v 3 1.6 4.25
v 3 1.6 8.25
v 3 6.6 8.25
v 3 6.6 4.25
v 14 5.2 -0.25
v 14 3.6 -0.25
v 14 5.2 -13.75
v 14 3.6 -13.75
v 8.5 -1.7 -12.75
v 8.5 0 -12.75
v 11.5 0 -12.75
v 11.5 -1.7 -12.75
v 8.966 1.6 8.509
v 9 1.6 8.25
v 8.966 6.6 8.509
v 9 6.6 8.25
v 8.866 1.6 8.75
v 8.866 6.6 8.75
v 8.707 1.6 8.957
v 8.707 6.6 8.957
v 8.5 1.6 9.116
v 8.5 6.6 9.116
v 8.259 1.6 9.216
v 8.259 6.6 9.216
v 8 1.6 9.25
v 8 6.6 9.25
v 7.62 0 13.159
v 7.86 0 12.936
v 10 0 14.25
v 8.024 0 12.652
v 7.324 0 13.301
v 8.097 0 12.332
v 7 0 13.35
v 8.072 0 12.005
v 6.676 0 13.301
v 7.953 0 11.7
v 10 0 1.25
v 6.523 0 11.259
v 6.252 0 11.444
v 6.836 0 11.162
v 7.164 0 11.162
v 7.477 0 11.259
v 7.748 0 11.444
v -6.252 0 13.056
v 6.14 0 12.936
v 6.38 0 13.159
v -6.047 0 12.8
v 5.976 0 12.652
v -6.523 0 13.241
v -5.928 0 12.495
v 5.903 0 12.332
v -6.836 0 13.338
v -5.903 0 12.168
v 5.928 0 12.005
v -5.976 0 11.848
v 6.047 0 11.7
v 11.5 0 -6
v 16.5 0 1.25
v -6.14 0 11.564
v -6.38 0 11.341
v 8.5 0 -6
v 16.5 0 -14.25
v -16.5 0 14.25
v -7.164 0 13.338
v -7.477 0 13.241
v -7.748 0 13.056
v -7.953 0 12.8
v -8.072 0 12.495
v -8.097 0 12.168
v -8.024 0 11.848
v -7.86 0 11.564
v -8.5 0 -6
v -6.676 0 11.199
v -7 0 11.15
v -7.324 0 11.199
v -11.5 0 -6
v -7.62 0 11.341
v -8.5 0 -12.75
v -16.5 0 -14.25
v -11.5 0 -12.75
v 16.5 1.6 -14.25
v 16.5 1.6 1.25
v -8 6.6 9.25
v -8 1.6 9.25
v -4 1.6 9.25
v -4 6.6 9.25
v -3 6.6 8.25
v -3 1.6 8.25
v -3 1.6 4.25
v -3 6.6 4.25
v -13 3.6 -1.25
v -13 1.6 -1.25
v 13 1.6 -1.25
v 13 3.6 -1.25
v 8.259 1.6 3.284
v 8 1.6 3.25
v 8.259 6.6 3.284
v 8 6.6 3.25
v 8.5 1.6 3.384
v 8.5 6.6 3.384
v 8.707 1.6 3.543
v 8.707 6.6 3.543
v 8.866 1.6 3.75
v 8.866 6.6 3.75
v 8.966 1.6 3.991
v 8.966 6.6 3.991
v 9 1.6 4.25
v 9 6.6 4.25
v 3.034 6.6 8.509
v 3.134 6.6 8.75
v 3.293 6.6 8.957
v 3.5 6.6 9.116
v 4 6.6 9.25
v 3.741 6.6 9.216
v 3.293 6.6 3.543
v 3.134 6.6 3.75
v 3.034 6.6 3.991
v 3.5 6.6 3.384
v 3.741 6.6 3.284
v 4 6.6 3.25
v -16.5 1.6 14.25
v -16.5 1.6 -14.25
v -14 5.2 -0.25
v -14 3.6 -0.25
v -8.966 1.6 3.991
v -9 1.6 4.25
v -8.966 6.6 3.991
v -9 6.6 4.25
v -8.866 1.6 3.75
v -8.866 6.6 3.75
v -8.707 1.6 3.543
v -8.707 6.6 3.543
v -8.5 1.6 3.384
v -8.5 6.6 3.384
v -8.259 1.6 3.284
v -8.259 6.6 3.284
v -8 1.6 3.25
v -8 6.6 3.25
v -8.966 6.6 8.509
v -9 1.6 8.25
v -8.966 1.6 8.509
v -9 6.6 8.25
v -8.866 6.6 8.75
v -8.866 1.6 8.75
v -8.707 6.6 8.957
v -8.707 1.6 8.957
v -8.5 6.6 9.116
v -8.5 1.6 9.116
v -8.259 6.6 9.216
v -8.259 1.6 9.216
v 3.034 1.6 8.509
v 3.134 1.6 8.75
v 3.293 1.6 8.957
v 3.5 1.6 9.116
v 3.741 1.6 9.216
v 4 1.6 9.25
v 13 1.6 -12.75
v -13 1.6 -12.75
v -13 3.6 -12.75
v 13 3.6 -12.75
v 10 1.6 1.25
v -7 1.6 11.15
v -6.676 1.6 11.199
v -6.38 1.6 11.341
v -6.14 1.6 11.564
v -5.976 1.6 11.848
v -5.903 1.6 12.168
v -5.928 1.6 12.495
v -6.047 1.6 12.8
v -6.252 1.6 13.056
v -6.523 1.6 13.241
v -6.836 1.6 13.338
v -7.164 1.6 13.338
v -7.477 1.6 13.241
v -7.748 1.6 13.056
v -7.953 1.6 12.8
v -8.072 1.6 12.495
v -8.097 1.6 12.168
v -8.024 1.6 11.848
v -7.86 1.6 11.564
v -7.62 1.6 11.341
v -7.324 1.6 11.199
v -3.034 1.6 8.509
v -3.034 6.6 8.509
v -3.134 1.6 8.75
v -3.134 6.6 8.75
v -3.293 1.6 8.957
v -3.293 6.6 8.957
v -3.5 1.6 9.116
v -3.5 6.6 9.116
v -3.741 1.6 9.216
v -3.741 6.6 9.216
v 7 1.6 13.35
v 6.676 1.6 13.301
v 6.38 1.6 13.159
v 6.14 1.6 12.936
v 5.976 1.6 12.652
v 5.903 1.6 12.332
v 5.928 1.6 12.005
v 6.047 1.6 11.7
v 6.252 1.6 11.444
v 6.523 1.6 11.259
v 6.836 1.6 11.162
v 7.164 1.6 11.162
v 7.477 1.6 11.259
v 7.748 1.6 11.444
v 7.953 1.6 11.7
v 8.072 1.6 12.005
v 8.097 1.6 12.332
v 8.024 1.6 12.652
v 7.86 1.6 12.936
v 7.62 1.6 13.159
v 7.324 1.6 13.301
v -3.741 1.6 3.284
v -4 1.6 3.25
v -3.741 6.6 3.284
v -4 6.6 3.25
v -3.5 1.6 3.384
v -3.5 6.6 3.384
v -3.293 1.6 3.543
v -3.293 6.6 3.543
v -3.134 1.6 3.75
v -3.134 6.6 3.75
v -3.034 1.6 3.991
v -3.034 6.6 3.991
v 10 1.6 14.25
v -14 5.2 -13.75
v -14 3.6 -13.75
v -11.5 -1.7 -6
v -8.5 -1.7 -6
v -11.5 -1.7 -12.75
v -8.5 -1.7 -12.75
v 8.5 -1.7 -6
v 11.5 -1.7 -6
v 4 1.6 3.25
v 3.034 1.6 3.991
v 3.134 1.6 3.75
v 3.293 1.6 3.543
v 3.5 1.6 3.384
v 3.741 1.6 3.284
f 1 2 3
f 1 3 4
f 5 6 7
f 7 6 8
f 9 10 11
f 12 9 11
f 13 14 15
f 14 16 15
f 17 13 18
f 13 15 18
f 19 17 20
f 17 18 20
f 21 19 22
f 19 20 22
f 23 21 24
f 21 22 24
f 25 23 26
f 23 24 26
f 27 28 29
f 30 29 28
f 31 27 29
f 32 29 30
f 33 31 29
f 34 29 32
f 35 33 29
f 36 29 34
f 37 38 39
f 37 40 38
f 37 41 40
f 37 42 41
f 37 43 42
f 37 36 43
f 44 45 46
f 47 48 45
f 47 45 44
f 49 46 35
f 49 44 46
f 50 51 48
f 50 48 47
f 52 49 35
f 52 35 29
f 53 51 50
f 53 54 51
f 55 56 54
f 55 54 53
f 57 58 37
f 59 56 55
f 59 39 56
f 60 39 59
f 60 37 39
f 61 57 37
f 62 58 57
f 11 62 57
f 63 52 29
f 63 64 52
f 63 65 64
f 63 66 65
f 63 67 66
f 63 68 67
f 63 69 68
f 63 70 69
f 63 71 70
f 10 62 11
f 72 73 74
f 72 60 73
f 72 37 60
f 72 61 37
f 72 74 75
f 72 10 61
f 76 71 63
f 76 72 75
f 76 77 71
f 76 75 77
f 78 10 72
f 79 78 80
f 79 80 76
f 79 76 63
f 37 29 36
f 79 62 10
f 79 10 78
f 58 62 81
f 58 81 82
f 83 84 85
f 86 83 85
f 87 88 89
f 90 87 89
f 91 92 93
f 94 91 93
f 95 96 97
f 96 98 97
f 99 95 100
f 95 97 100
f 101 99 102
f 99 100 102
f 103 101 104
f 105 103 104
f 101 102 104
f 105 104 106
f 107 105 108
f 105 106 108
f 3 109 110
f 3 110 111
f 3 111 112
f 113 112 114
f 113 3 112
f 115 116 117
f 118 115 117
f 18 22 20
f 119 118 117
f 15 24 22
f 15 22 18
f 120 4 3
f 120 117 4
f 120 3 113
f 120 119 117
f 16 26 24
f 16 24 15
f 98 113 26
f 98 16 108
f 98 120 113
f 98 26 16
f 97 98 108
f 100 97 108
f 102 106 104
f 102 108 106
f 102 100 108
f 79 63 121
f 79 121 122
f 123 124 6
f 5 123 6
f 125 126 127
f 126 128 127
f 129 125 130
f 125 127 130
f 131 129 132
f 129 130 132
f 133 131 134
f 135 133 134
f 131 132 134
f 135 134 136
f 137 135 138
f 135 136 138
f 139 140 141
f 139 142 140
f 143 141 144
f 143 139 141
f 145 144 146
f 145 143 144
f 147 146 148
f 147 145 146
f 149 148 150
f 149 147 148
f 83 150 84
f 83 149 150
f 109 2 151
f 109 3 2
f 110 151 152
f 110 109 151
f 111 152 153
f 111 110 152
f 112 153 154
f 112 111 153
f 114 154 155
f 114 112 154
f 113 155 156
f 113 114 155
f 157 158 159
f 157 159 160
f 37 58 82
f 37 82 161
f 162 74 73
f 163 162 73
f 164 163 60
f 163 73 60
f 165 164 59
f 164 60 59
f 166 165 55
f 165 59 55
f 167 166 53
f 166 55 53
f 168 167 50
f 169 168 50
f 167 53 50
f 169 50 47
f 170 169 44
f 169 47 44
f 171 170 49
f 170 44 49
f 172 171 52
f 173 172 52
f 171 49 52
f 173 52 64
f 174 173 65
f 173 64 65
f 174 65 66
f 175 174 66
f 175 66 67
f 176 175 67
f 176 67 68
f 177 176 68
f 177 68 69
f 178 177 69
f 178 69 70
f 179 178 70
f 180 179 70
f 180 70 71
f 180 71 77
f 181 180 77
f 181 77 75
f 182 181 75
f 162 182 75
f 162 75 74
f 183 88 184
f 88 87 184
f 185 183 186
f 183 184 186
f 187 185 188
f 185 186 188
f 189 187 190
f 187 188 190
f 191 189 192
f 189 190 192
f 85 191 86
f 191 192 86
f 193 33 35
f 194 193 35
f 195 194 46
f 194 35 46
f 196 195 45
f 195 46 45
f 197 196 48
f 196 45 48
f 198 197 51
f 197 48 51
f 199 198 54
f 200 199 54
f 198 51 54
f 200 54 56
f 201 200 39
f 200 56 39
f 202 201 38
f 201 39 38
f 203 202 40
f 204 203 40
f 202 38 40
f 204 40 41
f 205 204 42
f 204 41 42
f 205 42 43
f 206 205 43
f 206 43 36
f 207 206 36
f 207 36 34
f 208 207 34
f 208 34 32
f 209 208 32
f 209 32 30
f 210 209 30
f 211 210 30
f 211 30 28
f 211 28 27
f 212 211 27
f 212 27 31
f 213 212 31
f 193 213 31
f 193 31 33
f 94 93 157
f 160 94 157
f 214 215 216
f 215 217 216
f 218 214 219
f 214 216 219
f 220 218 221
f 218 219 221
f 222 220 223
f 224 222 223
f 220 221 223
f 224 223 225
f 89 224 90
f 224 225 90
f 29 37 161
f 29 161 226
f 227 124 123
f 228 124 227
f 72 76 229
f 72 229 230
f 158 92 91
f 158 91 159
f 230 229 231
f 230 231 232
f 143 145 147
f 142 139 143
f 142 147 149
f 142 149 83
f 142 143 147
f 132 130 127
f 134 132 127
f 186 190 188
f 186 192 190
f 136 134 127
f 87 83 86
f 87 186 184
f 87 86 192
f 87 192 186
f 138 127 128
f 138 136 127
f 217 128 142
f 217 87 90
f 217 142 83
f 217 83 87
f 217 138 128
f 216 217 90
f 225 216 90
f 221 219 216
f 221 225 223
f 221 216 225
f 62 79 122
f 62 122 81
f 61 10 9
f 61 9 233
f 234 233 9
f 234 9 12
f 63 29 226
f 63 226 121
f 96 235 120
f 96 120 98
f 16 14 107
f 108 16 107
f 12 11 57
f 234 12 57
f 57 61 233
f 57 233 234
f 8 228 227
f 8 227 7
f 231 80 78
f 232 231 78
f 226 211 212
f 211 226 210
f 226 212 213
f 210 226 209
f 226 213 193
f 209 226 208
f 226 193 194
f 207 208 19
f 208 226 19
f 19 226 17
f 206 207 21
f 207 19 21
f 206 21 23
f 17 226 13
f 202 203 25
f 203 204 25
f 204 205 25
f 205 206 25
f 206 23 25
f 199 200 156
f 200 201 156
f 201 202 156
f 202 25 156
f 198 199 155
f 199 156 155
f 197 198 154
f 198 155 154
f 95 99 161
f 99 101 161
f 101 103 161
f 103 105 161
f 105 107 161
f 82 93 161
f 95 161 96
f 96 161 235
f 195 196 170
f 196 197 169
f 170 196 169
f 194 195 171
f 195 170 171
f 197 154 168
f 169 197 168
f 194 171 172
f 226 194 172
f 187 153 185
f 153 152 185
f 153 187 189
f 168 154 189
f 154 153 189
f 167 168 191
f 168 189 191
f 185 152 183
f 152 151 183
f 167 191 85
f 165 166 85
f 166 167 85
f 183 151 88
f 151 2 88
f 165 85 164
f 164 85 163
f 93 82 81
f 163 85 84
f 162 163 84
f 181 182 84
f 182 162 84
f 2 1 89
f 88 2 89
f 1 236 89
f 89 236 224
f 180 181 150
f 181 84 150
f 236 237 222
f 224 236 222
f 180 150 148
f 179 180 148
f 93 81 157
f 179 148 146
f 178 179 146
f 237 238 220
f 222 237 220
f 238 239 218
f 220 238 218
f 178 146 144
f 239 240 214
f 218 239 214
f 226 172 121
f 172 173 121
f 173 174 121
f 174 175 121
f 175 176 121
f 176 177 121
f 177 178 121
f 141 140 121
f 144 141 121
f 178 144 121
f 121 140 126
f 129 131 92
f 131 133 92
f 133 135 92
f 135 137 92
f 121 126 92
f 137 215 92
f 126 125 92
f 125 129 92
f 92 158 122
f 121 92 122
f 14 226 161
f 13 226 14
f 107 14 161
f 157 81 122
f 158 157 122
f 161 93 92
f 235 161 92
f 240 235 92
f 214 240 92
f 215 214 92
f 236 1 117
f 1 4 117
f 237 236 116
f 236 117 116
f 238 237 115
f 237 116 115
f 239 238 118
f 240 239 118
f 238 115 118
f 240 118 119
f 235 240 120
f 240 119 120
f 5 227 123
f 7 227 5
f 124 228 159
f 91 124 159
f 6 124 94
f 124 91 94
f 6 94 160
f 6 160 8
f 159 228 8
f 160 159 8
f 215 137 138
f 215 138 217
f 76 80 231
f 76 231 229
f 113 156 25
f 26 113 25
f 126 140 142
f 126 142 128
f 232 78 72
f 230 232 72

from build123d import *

# Parameters (mm, degrees)
EXTRUDE_1_DEPTH     = 1.6
SKETCH_4_W          = 3
SKETCH_4_H          = 6.75
EXTRUDE_2_DEPTH     = 1.7
SKETCH_5_R          = 1.1
CUT_EXTRUDE_1_DEPTH = 22.867841686
SKETCH_6_W          = 6
SKETCH_6_H          = 6
EXTRUDE_3_DEPTH     = 5
FILLET_1_R          = 1
EXTRUDE_START       = 2
SKETCH_7_W          = 28
SKETCH_7_H          = 13.5
EXTRUDE_4_DEPTH     = 1.6
SKETCH_8_W          = 26
SKETCH_8_H          = 11.5
EXTRUDE_5_DEPTH     = 2


with BuildPart() as part:
    # 草图1 → 凸台-拉伸1 (new body)
    with BuildSketch(Plane(origin=(0, 0, 0), x_dir=(1, 0, 0), z_dir=(0, 1, 0))):
        Polygon((16.5, -1.25), (10, -1.25), (10, -14.25), (-16.5, -14.25), (-16.5, 14.25), (16.5, 14.25), align=None)
    extrude(amount=EXTRUDE_1_DEPTH)

    # 草图4 → 凸台-拉伸2 (add)
    with BuildSketch(Plane.XZ):
        with Locations((-10, -9.375)):
            Rectangle(SKETCH_4_W, SKETCH_4_H)
        with Locations((10, -9.375)):
            Rectangle(SKETCH_4_W, SKETCH_4_H)
    extrude(amount=EXTRUDE_2_DEPTH)

    # 草图5 → 切除-拉伸1 (cut, through all)
    with BuildSketch(Plane(origin=(0, 0, 0), x_dir=(-1, 0, 0), z_dir=(0, -1, 0))):
        with Locations(Location((7, -12.25, 0), (0, 0, 90))):
            Circle(SKETCH_5_R)
        with Locations(Location((-7, -12.25, 0), (0, 0, 270))):
            Circle(SKETCH_5_R)
    extrude(amount=-CUT_EXTRUDE_1_DEPTH, mode=Mode.SUBTRACT)

    # 草图6 → 凸台-拉伸3 (add)
    with BuildSketch(Plane(origin=(0, 1.6, 0), x_dir=(1, 0, 0), z_dir=(0, 1, 0))):
        with Locations((6, -6.25)):
            Rectangle(SKETCH_6_W, SKETCH_6_H)
        with Locations((-6, -6.25)):
            Rectangle(SKETCH_6_W, SKETCH_6_H)
    extrude(amount=EXTRUDE_3_DEPTH)

    # 圆角1
    fillet_1_edges = [part.edges().sort_by_distance(p)[0] for p in [
        (3, 4.1, 3.25),
        (3, 4.1, 9.25),
        (9, 4.1, 9.25),
        (9, 4.1, 3.25),
        (-3, 4.1, 9.25),
        (-3, 4.1, 3.25),
        (-9, 4.1, 3.25),
        (-9, 4.1, 9.25),
    ]]
    fillet(fillet_1_edges, radius=FILLET_1_R)



with BuildPart() as body_2:
    # 草图7 → 凸台-拉伸4 (new body)
    with BuildSketch(Plane(origin=(0, 1.6, 0), x_dir=(1, 0, 0), z_dir=(0, 1, 0)).offset(EXTRUDE_START)):
        with Locations((0, 7)):
            Rectangle(SKETCH_7_W, SKETCH_7_H)
    extrude(amount=EXTRUDE_4_DEPTH)


with BuildPart() as part_1:
    add(part.part)

    add(body_2.part)  # 凸台-拉伸5 merges body 2
    # 草图8 → 凸台-拉伸5 (add)
    with BuildSketch(Plane(origin=(0, 1.6, 0), x_dir=(1, 0, 0), z_dir=(0, 1, 0))):
        with Locations((0, 7)):
            Rectangle(SKETCH_8_W, SKETCH_8_H)
    extrude(amount=EXTRUDE_5_DEPTH)


solid = part_1.part
